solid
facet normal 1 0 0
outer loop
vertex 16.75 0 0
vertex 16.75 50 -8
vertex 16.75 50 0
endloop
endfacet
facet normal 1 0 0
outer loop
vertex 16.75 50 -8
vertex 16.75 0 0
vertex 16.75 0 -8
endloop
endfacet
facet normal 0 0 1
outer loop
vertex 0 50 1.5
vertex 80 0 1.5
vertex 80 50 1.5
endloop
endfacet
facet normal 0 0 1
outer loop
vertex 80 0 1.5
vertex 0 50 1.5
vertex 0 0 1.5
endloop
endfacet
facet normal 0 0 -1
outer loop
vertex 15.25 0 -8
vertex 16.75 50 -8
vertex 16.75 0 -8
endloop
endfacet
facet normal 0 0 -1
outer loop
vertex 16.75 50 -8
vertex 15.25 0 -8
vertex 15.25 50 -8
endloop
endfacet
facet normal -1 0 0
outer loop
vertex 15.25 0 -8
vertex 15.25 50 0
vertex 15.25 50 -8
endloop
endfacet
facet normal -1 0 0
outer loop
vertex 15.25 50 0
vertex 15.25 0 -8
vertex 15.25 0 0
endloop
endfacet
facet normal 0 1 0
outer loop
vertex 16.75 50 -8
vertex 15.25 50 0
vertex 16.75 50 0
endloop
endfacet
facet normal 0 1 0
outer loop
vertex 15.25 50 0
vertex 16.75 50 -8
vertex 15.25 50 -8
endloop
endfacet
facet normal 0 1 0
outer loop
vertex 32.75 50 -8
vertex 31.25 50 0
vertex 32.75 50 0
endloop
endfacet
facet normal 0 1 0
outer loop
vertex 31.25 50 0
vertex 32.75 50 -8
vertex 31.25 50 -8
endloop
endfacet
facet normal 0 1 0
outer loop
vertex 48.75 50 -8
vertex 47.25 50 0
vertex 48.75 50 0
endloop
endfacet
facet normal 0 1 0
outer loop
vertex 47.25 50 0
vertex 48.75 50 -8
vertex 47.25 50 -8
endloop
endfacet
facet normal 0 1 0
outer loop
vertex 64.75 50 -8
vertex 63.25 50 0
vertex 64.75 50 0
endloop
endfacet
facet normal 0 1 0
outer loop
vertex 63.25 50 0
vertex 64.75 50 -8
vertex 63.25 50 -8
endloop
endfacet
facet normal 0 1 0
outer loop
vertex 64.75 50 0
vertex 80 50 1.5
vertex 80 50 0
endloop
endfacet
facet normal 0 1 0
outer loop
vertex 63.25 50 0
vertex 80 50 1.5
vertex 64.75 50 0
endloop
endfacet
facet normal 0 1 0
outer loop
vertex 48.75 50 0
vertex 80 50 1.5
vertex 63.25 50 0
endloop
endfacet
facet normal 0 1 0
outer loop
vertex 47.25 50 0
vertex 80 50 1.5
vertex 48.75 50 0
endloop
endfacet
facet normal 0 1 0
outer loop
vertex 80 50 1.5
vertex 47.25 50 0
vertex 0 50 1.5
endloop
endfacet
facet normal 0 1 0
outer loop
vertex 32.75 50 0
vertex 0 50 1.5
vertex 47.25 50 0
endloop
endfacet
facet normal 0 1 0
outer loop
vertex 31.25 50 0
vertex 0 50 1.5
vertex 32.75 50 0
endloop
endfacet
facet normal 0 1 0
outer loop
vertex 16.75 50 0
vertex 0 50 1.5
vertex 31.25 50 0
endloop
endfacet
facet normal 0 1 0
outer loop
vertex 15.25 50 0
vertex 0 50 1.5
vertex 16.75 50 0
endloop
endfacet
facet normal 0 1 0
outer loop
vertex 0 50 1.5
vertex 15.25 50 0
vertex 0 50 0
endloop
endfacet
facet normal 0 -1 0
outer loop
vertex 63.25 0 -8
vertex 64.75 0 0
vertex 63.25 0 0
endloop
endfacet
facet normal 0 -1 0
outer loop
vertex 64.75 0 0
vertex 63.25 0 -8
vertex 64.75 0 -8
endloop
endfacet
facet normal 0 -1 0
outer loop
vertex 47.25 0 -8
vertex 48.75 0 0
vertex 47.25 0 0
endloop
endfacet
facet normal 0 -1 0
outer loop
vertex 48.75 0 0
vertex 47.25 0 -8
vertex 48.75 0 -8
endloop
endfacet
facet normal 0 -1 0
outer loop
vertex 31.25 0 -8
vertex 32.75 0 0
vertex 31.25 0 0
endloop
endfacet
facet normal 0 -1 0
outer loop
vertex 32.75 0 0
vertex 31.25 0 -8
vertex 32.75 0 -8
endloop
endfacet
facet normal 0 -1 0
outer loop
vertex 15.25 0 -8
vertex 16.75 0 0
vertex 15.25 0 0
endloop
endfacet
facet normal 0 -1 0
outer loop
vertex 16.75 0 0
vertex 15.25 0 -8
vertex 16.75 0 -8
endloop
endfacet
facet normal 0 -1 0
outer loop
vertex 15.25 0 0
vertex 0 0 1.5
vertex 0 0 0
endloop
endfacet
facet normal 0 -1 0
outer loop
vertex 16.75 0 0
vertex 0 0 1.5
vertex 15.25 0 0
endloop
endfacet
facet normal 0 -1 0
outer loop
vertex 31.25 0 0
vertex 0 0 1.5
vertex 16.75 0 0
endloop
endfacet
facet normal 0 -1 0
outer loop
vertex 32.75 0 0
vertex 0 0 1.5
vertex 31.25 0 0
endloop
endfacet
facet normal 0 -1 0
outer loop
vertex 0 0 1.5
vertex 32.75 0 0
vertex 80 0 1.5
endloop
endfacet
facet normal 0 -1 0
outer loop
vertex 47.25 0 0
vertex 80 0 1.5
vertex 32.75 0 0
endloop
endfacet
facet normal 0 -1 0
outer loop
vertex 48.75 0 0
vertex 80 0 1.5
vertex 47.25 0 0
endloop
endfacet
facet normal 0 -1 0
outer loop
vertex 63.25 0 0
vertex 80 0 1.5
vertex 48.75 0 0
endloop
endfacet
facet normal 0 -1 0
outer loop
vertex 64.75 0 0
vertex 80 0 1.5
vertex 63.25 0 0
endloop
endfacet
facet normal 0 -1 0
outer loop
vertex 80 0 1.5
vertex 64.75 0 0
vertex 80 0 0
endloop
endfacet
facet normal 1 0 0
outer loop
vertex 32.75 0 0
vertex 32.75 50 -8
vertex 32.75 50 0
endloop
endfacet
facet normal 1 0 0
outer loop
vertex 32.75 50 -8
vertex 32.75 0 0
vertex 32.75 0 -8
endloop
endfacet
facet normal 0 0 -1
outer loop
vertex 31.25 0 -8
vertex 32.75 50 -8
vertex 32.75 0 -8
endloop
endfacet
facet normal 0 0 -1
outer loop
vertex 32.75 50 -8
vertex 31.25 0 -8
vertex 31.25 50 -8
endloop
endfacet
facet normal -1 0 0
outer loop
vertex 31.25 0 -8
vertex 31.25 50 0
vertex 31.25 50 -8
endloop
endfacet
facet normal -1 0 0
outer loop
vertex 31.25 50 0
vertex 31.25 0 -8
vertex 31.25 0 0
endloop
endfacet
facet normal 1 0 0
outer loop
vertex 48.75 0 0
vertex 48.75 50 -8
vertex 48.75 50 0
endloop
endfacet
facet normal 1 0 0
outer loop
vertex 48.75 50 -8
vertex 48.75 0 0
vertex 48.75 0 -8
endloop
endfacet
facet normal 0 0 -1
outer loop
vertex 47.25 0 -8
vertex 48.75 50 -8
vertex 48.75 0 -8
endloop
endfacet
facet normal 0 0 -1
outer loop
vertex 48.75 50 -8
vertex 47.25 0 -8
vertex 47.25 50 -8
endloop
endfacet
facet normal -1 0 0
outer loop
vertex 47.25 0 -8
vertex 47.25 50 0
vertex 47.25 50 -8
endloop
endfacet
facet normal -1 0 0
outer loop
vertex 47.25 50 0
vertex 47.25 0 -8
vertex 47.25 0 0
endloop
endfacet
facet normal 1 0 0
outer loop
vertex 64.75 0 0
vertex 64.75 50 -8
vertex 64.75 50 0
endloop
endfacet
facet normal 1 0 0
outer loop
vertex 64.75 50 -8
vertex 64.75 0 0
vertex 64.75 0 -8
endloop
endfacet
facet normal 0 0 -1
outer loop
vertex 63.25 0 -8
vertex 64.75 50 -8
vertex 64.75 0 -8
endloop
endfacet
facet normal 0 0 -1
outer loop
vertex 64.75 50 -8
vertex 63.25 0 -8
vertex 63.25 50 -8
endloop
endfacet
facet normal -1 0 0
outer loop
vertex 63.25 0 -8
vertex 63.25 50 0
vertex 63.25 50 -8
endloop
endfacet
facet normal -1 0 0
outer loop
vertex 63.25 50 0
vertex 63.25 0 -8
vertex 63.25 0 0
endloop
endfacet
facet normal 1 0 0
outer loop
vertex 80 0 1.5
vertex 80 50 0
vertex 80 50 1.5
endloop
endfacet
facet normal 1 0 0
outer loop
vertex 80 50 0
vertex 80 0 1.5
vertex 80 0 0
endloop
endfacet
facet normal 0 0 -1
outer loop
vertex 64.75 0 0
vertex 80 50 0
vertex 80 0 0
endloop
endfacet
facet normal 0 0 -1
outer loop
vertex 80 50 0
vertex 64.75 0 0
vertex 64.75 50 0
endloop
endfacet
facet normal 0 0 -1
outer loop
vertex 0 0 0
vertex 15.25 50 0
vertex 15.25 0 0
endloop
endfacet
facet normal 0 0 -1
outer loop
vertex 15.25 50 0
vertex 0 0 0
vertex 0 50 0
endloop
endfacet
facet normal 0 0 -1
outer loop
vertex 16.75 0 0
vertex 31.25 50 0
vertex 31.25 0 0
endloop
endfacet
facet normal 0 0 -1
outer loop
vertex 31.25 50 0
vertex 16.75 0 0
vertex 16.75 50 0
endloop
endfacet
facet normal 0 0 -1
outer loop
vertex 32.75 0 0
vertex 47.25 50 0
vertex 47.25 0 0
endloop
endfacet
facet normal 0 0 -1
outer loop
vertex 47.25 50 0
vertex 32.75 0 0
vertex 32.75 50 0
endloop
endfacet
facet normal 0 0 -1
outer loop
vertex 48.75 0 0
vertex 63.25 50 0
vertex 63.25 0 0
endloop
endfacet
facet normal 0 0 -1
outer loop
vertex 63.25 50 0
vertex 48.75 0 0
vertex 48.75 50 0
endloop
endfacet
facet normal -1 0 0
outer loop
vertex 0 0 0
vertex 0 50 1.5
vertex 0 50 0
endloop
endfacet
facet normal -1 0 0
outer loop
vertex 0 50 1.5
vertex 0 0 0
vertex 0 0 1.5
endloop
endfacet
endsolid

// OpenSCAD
$fn = 32;

// ----------------------------------------------------------------------
// Ribbed panel: 1.5 mm panel
// ----------------------------------------------------------------------

// --- parameters (mm) ---
panel_l = 80;             // panel length, X
panel_w = 50;             // panel width, Y
panel_t = 1.5;            // panel thickness, Z
rib_t = 1.5;              // rib thickness
rib_h = 8;                // rib height below the panel
ribs = 4;                 // number of ribs

total_h = panel_t + rib_h;  // overall height

union() {
  cube([panel_l, panel_w, panel_t]);
  for (i = [1 : ribs])
    translate([i * panel_l / (ribs + 1) - rib_t / 2, 0, -rib_h])
      cube([rib_t, panel_w, rib_h + panel_t]);
}
